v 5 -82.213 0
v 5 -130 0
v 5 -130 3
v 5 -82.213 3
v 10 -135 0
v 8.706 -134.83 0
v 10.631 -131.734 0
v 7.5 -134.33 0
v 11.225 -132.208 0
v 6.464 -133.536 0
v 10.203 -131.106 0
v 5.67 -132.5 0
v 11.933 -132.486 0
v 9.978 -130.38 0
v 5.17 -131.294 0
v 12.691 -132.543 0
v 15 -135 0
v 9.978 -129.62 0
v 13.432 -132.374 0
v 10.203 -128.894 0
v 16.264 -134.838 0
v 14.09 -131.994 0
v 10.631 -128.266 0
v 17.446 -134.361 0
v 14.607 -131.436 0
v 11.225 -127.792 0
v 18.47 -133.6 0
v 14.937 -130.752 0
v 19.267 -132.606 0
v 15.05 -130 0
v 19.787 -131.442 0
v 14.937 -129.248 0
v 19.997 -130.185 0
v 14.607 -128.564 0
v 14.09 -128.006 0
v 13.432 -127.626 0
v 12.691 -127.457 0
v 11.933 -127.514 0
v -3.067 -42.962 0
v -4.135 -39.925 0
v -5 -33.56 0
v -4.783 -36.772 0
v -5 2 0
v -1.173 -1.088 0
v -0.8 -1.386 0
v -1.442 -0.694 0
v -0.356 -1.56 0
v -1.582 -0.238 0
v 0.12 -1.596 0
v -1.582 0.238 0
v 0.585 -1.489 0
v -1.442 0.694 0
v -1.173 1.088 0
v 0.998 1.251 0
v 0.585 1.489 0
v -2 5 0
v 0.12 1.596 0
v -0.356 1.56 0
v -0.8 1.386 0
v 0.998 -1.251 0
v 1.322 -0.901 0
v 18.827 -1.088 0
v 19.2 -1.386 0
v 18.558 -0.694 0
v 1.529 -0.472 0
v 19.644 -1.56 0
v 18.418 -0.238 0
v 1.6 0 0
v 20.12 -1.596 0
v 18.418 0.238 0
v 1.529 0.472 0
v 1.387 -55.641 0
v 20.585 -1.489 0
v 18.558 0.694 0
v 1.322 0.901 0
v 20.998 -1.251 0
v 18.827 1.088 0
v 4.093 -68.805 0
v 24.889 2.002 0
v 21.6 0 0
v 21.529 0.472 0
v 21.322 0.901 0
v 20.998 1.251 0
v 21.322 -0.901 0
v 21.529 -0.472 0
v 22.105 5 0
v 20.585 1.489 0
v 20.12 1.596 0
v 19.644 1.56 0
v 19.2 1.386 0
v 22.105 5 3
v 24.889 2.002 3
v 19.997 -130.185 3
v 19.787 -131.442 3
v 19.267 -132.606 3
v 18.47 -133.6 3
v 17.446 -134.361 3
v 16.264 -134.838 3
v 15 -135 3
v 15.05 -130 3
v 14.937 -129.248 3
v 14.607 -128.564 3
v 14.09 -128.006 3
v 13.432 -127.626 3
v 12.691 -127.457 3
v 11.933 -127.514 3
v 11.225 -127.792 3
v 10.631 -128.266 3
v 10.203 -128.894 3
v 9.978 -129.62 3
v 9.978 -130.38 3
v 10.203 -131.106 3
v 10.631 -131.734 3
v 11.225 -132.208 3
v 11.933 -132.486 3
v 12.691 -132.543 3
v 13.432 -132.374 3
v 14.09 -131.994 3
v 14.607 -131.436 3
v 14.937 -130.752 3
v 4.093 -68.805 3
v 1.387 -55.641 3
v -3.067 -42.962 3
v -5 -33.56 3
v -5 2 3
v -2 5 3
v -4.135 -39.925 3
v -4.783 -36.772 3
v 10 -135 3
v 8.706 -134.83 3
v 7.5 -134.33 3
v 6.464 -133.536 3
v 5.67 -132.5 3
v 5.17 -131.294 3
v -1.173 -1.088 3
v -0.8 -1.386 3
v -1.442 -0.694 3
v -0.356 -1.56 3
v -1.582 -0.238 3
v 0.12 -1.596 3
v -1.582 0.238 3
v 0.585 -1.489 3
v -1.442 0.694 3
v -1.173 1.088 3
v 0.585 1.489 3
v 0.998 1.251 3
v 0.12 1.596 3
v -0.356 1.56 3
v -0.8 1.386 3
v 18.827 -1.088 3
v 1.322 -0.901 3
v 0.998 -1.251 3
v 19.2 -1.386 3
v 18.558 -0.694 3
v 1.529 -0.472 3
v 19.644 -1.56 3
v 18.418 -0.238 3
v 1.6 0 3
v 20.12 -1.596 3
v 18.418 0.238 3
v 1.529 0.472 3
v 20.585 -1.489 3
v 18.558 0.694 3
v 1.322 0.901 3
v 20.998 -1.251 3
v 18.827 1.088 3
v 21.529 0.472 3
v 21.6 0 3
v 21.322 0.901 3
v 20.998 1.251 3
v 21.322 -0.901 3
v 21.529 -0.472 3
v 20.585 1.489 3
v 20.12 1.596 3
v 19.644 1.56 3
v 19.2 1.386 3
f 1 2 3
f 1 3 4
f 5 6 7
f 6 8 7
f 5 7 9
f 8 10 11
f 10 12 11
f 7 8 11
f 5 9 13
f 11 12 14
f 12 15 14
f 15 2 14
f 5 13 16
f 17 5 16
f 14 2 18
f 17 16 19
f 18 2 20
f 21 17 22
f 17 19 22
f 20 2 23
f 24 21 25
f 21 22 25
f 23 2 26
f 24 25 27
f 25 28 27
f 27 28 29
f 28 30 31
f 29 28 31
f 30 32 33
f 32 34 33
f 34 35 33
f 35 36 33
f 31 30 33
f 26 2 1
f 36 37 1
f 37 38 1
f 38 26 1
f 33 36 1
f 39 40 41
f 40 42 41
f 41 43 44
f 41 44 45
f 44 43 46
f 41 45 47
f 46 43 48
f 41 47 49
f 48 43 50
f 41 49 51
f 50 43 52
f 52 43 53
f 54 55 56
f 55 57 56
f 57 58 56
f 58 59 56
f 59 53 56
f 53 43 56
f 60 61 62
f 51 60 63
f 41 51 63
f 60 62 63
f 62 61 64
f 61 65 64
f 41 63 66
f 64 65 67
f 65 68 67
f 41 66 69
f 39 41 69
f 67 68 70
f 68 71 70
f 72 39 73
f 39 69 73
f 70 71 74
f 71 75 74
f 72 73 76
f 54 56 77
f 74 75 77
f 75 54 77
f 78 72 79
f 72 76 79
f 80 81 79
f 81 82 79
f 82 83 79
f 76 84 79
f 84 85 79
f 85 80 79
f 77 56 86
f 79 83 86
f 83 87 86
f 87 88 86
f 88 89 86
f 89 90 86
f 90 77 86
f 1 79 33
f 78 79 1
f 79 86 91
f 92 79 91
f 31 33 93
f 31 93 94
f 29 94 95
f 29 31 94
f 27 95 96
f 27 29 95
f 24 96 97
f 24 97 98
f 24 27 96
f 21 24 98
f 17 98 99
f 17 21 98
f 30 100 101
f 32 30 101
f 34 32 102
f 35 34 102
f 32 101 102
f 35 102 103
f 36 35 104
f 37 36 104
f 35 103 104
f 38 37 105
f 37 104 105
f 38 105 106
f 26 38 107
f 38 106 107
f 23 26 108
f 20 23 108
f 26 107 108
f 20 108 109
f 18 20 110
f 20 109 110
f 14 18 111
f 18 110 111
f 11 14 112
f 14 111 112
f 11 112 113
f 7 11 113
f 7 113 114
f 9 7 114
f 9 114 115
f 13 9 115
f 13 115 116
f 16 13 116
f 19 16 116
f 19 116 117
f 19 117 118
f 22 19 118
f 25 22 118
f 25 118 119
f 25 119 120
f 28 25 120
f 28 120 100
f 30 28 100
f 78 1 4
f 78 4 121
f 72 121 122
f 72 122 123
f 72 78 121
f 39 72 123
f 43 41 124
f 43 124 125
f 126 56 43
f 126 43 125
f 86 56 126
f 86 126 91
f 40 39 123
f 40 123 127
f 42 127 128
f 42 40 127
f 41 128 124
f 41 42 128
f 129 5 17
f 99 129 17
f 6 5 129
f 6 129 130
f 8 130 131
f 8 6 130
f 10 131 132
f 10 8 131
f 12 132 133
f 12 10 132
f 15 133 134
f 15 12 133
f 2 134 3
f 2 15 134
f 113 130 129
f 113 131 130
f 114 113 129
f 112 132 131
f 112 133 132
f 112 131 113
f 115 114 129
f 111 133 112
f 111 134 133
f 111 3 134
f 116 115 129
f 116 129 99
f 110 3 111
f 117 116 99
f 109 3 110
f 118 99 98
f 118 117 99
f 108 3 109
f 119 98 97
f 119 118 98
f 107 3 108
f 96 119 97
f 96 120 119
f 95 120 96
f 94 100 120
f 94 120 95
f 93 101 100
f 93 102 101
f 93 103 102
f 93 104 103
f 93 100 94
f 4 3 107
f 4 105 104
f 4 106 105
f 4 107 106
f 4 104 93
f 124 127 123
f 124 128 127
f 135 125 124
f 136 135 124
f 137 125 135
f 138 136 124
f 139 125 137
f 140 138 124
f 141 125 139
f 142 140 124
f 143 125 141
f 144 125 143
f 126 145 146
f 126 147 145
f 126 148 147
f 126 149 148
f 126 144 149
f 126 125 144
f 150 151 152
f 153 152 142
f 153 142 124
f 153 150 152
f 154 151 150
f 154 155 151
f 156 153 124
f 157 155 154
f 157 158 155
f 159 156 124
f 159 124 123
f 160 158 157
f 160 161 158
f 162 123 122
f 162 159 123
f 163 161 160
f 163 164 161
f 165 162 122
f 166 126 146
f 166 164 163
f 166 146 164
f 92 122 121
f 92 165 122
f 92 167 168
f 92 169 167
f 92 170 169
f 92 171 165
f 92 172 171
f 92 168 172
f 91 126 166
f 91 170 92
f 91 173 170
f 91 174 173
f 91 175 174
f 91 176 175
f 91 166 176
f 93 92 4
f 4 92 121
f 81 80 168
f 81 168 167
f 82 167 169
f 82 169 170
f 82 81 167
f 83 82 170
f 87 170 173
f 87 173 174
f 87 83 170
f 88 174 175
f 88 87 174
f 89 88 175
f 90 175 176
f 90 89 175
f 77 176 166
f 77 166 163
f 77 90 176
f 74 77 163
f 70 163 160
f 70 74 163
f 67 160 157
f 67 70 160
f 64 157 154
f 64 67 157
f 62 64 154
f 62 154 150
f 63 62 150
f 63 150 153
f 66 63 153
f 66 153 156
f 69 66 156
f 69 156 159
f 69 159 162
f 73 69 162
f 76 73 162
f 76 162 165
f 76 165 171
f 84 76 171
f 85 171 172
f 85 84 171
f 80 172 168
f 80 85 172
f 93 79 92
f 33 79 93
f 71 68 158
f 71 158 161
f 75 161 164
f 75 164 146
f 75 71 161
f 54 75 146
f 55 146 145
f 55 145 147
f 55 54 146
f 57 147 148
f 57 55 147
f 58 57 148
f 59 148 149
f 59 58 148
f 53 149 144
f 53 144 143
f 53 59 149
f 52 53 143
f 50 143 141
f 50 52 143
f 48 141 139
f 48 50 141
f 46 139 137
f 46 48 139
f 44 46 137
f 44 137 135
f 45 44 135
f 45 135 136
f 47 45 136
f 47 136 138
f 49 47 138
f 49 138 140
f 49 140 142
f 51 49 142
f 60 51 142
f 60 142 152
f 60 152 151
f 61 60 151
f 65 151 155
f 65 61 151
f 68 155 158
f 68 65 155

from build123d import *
from OCP.BRepFilletAPI import BRepFilletAPI_MakeChamfer

# Parameters (mm, degrees)
SKETCH_1_W          = 30
SKETCH_1_H          = 140
SKETCH_1_R          = 1.6
EXTRUDE_1_DEPTH     = 3
CUT_EXTRUDE_3_REACH = 139.328
SKETCH_4_W          = 5
SKETCH_4_H          = 55
CHAMFER_1_SIZE      = 2.5
CUT_EXTRUDE_4_REACH = 139.328
SKETCH_5_R          = 2.55
EXTRUDE_5_DEPTH     = 3
EXTRUDE_2_DEPTH     = 3
FILLET_2_R          = 65
FILLET_3_R          = 115
FILLET_4_R          = 5
CUT_EXTRUDE_START   = -3
CUT_EXTRUDE_6_DEPTH = 3
CHAMFER_2_SIZE      = 3
CHAMFER_2_SIZE2     = 2.894908666


# Read off the part's stored shape, not the designer's step: 切除-拉伸6
with BuildPart() as part:
    # 草图1 → 凸台-拉伸1 (new body)
    with BuildSketch(Plane.XY):
        with Locations((10, -65)):
            Rectangle(SKETCH_1_W, SKETCH_1_H)
        Circle(SKETCH_1_R, mode=Mode.SUBTRACT)
        with Locations((20, 0)):
            Circle(SKETCH_1_R, mode=Mode.SUBTRACT)
    extrude(amount=EXTRUDE_1_DEPTH)

    # 草图4 → 切除-拉伸3 (cut, up to next)
    with BuildSketch(Plane.XY.offset(3), mode=Mode.PRIVATE) as cut_extrude_3_sk1:
        with Locations((-2.5, -107.5)):
            Rectangle(SKETCH_4_W, SKETCH_4_H)
    cut_extrude_3_tool1 = extrude(cut_extrude_3_sk1.sketch, amount=-CUT_EXTRUDE_3_REACH, mode=Mode.PRIVATE) & part.part
    add(cut_extrude_3_tool1.solids().sort_by_distance((-2.5, -107.5, 3))[0], mode=Mode.SUBTRACT)

    # 倒角1
    chamfer_1_edges = [part.edges().sort_by_distance(p)[0] for p in [
        (-5, -80, 1.5),
    ]]
    chamfer(chamfer_1_edges, length=CHAMFER_1_SIZE)

    # 草图5 → 切除-拉伸4 (cut, up to next)
    with BuildSketch(Plane.XY.offset(3), mode=Mode.PRIVATE) as cut_extrude_4_sk1:
        with Locations((12.5, -130)):
            Circle(SKETCH_5_R)
    cut_extrude_4_tool1 = extrude(cut_extrude_4_sk1.sketch, amount=-CUT_EXTRUDE_4_REACH, mode=Mode.PRIVATE) & part.part
    add(cut_extrude_4_tool1.solids().sort_by_distance((12.5, -130, 3))[0], mode=Mode.SUBTRACT)

    # 草图9 → 凸台-拉伸5 (add)
    with BuildSketch(Plane(origin=(0, 0, 0), x_dir=(-1, 0, 0), z_dir=(0, 0, -1))):
        Polygon((5, -77.5), (0, -107.5), (0, -80), (2.5, -80), align=None)
    extrude(amount=-EXTRUDE_5_DEPTH)

    # 草图11 → 拉伸-薄壁2 (add)
    with BuildSketch(Plane.XY.offset(3)):
        Polygon((19.5, -67.916286439), (19.5, -61.710608008), (19.5, -3.420169007), (16.5, -3.420169007), (16.5, -61.710608008), (16.5, -67.916286439), align=None)
    extrude(amount=-EXTRUDE_2_DEPTH)

    # 圆角2
    fillet_2_edges = [part.edges().sort_by_distance(p)[0] for p in [
        (-5, -77.5, 1.5),
    ]]
    fillet(fillet_2_edges, radius=FILLET_2_R)

    # 圆角3
    fillet_3_edges = [part.edges().sort_by_distance(p)[0] for p in [
        (0, -107.5, 1.5),
    ]]
    fillet(fillet_3_edges, radius=FILLET_3_R)

    # 圆角4
    fillet_4_edges = [part.edges().sort_by_distance(p)[0] for p in [
        (0, -135, 1.5),
    ]]
    fillet(fillet_4_edges, radius=FILLET_4_R)

    # 切除-拉伸6 outline → 切除-拉伸6 (cut)
    with BuildSketch(Plane.XY.offset(3).offset(CUT_EXTRUDE_START)):
        with BuildLine():
            ThreePointArc((19.996578854, -130.184931767), (18.469534635, -133.600323516), (15, -135))
            Line((15, -135), (25, -135))
            Line((25, -135), (25, 5))
            Line((25, 5), (19.996578854, -130.184931767))
        make_face()
        with BuildLine():
            ThreePointArc((10, -135), (6.464466094, -133.535533906), (5, -130))
            Line((5, -130), (5, -82.212778368))
            ThreePointArc((5, -82.212778368), (2.962270532, -62.17737686), (-3.067466378, -42.962488681))
            ThreePointArc((-3.067466378, -42.962488681), (-4.511868965, -38.359628786), (-5, -33.560217765))
            Line((-5, -33.560217765), (-5, -72.120435531))
            ThreePointArc((-5, -72.120435531), (-4.778523942, -77.481670081), (-4.115605049, -82.806369705))
            Line((-4.115605049, -82.806369705), (-1.564698759, -98.111807444))
            ThreePointArc((-1.564698759, -98.111807444), (-0.391842257, -107.532429856), (0, -117.017690984))
            Line((0, -117.017690984), (0, -130))
            ThreePointArc((0, -130), (1.464466094, -133.535533906), (5, -135))
            Line((5, -135), (10, -135))
        make_face()
    extrude(amount=CUT_EXTRUDE_6_DEPTH, mode=Mode.SUBTRACT)

    # 倒角2: one chamfer whose edges measure the first distance from different faces: ONE call of the kernel's chamfer builder (chamfer() names one face for all edges)
    chamfer_2_edges_1 = [part.edges().sort_by_distance(p)[0] for p in [
        (-5, 5, 1.5),
    ]]
    chamfer_2_edges_2 = [part.edges().sort_by_distance(p)[0] for p in [
        (25, 5, 1.5),
    ]]
    chamfer_2_side_2 = [part.faces().sort_by_distance(p)[0] for p in [
        (22.498289427, -62.592465884, 1.5),
    ]]
    chamfer_2 = BRepFilletAPI_MakeChamfer(part.part.solid().wrapped)
    for e in chamfer_2_edges_1:
        chamfer_2.Add(CHAMFER_2_SIZE, e.wrapped)
    for e in chamfer_2_edges_2:
        chamfer_2.Add(CHAMFER_2_SIZE, CHAMFER_2_SIZE2, e.wrapped, chamfer_2_side_2[0].wrapped)  # the first distance lies on this face
    add(Compound.cast(chamfer_2.Shape()), mode=Mode.REPLACE)


solid = part.part
